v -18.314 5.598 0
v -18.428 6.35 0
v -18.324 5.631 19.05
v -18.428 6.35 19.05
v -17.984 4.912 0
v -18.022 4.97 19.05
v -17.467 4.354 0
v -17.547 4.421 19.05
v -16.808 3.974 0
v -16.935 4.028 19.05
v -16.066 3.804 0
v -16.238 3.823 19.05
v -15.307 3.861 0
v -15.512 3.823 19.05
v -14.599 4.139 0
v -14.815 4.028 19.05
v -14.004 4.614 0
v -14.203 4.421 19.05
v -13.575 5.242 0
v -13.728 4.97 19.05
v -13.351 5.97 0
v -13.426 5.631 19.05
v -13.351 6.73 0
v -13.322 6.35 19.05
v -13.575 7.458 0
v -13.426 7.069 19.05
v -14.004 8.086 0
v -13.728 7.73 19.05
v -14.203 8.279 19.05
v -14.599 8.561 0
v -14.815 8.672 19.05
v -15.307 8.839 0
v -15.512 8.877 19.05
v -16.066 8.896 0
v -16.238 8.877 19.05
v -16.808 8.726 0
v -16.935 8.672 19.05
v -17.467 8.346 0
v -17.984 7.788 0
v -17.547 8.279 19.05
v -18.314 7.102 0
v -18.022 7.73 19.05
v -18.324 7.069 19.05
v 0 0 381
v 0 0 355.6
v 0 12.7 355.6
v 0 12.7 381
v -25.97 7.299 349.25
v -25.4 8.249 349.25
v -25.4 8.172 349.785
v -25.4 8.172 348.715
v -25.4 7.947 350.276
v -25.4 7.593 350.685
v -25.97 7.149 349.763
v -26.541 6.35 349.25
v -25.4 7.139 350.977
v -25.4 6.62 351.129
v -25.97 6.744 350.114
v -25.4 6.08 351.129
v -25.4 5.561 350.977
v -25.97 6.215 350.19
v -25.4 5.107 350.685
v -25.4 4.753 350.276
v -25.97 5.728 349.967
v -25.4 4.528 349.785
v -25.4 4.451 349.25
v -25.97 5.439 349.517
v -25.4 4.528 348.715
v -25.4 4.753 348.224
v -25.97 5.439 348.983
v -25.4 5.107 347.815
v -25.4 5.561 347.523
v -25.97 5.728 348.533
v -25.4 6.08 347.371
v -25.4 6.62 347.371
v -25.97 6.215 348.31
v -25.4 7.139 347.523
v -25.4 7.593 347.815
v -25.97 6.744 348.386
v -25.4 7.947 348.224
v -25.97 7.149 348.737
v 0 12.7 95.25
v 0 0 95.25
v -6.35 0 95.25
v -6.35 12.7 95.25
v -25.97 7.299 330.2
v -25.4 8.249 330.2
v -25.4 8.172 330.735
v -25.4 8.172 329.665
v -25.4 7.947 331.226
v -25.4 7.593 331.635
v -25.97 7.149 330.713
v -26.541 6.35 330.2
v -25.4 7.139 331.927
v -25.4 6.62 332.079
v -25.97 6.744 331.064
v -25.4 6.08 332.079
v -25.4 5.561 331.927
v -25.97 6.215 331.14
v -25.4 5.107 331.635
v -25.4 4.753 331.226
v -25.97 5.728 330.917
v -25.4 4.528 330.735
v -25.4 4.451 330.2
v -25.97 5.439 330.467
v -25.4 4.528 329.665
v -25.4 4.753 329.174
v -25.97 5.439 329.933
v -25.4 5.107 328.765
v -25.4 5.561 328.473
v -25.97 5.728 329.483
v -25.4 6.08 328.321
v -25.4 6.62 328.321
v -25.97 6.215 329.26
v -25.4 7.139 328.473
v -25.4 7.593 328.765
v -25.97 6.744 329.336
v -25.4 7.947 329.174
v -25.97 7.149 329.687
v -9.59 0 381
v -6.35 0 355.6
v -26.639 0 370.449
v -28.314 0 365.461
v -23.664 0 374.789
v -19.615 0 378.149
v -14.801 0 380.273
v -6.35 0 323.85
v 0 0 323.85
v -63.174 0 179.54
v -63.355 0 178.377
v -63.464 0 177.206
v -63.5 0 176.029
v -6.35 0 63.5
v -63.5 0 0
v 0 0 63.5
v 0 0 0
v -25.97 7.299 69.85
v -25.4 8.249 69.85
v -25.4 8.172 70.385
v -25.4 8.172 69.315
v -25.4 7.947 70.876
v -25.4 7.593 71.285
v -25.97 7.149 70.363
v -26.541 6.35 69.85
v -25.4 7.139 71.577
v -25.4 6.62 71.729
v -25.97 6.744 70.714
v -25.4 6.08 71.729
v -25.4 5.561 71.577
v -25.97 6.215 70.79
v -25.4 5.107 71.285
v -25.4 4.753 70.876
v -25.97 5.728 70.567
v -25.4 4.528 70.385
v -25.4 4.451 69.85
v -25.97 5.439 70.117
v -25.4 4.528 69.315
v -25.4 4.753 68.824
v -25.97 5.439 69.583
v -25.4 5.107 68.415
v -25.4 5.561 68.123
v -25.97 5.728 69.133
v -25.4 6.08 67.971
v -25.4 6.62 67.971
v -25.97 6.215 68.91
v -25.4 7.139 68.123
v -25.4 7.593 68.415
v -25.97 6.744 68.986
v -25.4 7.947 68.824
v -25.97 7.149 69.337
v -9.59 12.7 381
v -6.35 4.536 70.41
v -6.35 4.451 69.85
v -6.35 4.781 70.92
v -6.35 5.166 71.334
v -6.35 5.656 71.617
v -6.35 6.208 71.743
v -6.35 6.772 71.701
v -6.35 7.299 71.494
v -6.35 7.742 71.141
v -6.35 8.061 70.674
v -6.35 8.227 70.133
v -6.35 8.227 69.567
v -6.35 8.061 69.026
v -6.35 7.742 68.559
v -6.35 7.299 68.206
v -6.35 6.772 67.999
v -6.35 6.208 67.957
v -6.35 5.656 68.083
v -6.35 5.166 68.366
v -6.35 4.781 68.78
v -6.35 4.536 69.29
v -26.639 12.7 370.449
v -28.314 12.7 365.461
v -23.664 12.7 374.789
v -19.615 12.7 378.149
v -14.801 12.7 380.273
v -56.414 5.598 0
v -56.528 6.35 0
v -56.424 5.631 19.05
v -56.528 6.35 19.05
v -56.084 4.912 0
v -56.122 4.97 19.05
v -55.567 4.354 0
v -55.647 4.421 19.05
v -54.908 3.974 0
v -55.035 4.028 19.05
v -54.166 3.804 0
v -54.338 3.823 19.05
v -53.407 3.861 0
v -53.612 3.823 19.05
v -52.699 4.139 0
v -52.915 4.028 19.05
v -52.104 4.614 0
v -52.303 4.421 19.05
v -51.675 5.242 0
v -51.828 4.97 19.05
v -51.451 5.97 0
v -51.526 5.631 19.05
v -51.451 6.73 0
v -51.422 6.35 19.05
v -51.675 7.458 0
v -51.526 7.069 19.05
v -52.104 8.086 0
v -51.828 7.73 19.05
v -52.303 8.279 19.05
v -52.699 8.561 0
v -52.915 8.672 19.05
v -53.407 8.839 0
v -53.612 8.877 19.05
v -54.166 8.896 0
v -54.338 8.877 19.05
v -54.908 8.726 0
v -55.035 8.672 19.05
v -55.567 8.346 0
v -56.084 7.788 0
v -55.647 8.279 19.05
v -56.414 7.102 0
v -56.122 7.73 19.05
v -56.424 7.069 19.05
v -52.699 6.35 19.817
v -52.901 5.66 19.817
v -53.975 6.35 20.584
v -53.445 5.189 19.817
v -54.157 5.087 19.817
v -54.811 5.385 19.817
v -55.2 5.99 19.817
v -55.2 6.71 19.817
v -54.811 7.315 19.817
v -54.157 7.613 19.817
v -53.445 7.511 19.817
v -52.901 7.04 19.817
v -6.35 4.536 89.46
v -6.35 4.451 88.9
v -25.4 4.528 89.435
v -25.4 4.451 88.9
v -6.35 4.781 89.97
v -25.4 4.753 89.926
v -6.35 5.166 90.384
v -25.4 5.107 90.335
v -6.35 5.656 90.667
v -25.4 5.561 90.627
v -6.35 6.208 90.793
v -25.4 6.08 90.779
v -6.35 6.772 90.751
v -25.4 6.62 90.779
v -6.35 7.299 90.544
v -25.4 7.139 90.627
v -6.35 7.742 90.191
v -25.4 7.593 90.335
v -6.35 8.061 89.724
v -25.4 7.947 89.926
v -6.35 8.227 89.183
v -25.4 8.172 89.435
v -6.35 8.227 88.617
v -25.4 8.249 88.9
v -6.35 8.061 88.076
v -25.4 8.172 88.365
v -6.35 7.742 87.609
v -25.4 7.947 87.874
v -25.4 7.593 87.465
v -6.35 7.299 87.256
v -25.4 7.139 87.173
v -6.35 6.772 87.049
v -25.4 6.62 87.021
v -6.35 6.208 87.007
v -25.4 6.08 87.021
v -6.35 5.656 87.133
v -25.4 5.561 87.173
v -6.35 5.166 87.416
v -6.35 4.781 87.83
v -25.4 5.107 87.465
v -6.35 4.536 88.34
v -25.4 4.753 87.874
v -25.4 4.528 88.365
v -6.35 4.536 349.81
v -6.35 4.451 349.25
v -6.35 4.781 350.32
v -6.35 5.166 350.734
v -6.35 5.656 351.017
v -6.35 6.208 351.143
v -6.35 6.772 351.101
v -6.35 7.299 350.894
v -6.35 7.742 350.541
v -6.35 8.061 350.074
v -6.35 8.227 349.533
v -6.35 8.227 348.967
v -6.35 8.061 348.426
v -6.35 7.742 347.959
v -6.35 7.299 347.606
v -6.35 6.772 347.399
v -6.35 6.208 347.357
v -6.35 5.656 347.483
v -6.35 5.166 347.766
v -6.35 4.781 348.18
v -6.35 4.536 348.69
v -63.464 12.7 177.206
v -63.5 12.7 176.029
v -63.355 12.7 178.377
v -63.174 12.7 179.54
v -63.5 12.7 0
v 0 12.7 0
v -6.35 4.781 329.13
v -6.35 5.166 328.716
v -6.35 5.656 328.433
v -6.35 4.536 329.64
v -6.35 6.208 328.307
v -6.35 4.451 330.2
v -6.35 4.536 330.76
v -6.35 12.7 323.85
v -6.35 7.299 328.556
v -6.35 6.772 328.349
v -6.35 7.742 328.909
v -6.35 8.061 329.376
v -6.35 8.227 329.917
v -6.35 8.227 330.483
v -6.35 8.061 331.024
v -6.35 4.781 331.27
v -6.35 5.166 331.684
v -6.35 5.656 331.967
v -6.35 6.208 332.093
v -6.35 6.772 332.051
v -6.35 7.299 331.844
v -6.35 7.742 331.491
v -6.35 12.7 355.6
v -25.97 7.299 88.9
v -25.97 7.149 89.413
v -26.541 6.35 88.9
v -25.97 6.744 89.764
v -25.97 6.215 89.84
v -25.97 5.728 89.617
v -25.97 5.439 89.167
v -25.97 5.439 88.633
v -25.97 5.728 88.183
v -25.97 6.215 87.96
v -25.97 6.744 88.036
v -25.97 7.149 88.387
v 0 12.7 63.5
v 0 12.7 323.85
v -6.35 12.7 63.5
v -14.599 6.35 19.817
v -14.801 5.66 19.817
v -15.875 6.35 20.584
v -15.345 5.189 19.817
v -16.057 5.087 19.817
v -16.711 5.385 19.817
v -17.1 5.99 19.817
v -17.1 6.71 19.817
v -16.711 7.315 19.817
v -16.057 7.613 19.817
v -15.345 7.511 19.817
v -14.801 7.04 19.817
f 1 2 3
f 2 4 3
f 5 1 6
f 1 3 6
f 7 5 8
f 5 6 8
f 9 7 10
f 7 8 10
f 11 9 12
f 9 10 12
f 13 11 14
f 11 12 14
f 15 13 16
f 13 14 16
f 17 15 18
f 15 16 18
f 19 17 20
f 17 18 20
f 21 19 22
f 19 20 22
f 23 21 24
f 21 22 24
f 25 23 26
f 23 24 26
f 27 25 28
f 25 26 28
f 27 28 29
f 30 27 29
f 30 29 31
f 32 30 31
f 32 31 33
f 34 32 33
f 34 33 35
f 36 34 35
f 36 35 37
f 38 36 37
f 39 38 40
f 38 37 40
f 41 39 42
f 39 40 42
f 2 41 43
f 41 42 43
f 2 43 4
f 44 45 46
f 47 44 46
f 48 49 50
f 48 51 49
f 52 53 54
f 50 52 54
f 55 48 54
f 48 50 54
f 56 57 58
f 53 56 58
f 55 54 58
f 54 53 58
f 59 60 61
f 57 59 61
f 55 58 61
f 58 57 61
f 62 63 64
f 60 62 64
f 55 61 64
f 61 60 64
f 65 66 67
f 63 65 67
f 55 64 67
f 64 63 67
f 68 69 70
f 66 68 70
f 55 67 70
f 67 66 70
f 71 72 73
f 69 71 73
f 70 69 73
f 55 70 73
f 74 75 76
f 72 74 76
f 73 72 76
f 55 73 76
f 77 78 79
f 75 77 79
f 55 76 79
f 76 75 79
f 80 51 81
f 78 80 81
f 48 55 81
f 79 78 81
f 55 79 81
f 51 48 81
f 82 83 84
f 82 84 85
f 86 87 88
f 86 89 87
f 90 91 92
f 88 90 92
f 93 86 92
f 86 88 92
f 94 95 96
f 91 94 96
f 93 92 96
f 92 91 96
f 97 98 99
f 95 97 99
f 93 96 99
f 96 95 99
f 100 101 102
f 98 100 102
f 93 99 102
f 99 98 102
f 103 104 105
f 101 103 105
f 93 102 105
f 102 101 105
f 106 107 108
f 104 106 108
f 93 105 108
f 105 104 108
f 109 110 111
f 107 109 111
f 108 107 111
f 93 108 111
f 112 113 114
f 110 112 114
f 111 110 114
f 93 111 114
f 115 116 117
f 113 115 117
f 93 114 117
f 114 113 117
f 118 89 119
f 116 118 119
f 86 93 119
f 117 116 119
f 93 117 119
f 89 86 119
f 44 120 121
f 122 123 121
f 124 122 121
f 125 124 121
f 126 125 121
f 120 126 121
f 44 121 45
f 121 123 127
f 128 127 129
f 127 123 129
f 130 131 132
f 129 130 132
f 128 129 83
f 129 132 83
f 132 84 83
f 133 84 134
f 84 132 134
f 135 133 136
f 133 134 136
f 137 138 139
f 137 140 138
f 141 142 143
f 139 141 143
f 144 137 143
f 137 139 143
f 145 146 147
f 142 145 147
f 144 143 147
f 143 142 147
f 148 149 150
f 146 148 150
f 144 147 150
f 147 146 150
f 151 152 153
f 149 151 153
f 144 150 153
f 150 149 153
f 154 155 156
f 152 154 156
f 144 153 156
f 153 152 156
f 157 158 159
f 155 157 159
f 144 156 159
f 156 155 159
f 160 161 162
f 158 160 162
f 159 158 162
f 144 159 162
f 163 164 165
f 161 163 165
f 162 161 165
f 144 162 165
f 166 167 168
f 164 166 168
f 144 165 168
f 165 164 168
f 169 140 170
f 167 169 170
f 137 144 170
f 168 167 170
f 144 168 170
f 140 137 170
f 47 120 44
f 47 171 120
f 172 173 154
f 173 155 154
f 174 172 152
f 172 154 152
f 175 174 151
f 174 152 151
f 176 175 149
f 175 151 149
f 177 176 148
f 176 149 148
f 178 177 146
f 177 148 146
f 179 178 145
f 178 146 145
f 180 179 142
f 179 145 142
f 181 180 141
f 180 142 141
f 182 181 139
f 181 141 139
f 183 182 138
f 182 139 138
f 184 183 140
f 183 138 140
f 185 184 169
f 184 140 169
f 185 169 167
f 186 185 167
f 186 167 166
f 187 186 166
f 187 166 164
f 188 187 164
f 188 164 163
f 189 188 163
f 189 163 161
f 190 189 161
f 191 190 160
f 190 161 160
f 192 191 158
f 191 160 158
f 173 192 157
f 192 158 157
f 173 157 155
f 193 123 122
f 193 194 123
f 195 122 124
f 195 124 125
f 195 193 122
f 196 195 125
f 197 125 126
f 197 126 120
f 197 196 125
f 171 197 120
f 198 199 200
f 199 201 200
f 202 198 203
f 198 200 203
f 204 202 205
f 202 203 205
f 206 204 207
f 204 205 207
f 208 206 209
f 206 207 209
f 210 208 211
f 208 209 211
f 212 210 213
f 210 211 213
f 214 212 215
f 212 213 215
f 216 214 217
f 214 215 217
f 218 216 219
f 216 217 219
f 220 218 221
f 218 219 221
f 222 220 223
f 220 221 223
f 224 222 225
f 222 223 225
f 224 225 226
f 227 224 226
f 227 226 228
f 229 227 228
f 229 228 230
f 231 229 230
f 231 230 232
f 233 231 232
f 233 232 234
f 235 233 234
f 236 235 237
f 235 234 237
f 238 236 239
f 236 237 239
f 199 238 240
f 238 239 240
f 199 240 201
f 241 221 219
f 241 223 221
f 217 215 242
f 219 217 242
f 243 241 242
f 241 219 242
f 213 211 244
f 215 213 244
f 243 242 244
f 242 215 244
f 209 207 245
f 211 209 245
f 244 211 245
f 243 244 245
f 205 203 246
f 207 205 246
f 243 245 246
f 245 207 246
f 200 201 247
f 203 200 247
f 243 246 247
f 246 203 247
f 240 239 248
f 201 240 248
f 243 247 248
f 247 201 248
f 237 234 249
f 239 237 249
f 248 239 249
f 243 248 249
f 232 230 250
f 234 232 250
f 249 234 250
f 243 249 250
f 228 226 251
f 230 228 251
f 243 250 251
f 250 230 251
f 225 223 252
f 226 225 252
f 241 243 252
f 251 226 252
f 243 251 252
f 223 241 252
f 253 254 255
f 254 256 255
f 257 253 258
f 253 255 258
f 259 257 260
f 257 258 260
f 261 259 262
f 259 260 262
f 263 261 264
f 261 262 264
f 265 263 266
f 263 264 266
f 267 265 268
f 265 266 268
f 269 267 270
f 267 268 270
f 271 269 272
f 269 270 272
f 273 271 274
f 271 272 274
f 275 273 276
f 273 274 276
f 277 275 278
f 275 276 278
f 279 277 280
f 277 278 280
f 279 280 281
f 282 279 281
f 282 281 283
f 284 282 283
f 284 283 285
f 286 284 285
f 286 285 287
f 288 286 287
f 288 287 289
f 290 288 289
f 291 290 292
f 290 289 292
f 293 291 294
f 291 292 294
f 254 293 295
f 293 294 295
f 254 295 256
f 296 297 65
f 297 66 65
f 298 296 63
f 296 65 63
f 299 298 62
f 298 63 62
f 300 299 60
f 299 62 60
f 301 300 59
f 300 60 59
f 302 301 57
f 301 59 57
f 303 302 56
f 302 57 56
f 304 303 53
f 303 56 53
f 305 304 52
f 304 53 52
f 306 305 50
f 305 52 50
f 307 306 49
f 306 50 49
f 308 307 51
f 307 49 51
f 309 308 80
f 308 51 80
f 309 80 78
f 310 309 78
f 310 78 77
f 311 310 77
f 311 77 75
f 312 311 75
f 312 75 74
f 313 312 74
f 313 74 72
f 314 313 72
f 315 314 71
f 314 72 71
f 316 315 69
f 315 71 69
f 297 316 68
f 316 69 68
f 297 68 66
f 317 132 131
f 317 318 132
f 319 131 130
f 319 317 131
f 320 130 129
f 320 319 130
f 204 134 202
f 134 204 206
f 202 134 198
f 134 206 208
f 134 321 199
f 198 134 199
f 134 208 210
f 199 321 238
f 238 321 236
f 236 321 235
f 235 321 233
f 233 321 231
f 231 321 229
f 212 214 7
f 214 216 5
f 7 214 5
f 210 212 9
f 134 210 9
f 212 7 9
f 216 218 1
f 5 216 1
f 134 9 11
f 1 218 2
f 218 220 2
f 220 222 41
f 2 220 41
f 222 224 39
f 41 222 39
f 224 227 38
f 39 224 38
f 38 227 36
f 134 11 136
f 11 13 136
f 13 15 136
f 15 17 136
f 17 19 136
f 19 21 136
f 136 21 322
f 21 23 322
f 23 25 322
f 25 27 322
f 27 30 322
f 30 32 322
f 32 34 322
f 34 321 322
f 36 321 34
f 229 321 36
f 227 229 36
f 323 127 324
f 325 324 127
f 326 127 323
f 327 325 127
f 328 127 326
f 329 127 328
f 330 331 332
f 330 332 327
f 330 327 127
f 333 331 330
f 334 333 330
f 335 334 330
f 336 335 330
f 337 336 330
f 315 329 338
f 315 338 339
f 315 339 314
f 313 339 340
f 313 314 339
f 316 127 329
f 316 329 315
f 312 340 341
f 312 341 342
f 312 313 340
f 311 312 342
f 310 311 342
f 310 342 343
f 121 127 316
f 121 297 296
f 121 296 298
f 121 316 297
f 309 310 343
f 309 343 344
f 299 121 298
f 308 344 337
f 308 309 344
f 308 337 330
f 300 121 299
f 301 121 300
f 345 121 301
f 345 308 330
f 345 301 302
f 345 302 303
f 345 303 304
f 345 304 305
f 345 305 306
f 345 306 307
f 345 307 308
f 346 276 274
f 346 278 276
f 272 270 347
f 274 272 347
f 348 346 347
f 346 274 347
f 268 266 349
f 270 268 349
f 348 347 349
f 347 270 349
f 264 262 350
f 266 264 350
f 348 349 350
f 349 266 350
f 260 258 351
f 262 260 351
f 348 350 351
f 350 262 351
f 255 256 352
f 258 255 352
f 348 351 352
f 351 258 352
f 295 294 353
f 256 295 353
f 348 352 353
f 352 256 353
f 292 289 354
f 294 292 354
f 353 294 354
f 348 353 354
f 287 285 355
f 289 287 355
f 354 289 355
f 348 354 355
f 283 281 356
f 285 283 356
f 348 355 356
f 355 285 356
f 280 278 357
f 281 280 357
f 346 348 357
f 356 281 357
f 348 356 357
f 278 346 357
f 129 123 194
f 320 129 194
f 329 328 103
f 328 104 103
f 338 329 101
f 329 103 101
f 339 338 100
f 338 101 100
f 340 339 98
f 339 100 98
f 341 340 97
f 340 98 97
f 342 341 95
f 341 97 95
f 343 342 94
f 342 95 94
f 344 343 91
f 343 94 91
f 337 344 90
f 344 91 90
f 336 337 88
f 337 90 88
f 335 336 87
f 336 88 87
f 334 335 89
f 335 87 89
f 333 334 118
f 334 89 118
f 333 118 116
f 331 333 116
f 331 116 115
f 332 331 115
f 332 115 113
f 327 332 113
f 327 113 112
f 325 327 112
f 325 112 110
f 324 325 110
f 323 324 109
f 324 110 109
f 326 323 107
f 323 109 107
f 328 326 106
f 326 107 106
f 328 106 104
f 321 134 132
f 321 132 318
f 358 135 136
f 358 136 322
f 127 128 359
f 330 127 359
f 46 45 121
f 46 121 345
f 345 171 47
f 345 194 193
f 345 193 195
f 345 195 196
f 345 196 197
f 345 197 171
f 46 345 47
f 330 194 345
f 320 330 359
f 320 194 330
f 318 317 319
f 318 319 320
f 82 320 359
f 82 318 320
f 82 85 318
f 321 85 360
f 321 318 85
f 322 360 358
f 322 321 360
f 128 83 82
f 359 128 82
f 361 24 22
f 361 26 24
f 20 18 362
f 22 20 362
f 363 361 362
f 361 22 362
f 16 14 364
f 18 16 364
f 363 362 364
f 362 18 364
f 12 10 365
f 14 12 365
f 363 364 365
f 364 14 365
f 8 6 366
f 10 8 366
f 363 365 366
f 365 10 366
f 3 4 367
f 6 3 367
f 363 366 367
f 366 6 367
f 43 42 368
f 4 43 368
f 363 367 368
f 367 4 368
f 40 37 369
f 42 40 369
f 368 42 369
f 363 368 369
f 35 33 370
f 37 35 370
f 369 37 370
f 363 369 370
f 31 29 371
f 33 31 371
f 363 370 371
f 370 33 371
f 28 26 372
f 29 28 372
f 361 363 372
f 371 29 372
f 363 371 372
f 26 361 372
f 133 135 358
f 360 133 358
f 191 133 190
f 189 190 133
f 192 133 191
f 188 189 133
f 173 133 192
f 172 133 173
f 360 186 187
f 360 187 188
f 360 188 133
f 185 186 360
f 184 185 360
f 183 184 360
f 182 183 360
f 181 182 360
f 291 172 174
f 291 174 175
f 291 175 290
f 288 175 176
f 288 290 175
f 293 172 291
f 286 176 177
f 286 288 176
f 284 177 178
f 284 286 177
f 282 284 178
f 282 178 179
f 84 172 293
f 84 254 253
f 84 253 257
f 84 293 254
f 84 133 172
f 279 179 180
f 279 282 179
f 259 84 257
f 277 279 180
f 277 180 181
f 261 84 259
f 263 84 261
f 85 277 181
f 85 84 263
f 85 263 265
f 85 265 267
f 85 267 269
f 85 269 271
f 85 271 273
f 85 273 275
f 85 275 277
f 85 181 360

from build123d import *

# Parameters (mm, degrees)
F0_W     = 63.5
F0_H     = 12.7
F1_DEPTH = 381
F3_D     = 5.1054
F3_DEPTH = 19.05
F3_TIP   = 1.5338169022
F4_W     = 50.8
F4_H     = 31.75
F5_DEPTH = 6.35
F7_D     = 3.7973
F7_DEPTH = 19.05
F7_START = 6.35
F7_TIP   = 1.1408240143
F8_SIZE2 = 38.1
F8_SIZE  = 203.2
F9_R     = 19.05


with BuildPart() as f1:
    # F0 (on Top) → F1 (new body)
    with BuildSketch(Plane.XY):
        with Locations((-31.75, 6.35)):
            Rectangle(F0_W, F0_H)
    extrude(amount=F1_DEPTH)

    # F3
    with Locations(Plane(origin=(0, 0, 0), x_dir=(1, 0, 0), z_dir=(0, 0, -1))):
        with Locations((-15.875, -6.35), (-53.975, -6.35)):
            Hole(F3_D / 2, depth=F3_DEPTH)
            with Locations((0, 0, -(F3_DEPTH + F3_TIP / 2))):  # 118° drill point
                Cone(0, F3_D / 2, F3_TIP, mode=Mode.SUBTRACT)

    # F4 (on face) → F5 (cut)
    with BuildSketch(Plane.YZ):
        with Locations((25.4, 79.375)):
            Rectangle(F4_W, F4_H)
        with Locations((25.4, 339.725)):
            Rectangle(F4_W, F4_H)
    extrude(amount=-F5_DEPTH, mode=Mode.SUBTRACT)

    # F7
    # its depths count from where the whole tool has entered the part; down to there all is cleared
    with Locations(Plane.YZ.offset(-F7_START)):
        with Locations((6.35, 69.85), (6.35, 88.9), (6.35, 330.2), (6.35, 349.25)):
            Hole(F7_D / 2, depth=F7_DEPTH)
            with Locations((0, 0, -(F7_DEPTH + F7_TIP / 2))):  # 118° drill point
                Cone(0, F7_D / 2, F7_TIP, mode=Mode.SUBTRACT)

    # F8
    f8_edges = [f1.edges().sort_by_distance(p)[0] for p in [
        (-63.5, 6.35, 381),
    ]]
    f8_side = f1.faces().sort_by_distance((-63.5, 6.35, 190.5))[0]
    chamfer(f8_edges, length=F8_SIZE, length2=F8_SIZE2, reference=f8_side)

    # F9
    f9_edges = [f1.edges().sort_by_distance(p)[0] for p in [
        (-25.4, 6.35, 381),
        (-63.5, 6.35, 177.8),
    ]]
    fillet(f9_edges, radius=F9_R)


solid = f1.part
